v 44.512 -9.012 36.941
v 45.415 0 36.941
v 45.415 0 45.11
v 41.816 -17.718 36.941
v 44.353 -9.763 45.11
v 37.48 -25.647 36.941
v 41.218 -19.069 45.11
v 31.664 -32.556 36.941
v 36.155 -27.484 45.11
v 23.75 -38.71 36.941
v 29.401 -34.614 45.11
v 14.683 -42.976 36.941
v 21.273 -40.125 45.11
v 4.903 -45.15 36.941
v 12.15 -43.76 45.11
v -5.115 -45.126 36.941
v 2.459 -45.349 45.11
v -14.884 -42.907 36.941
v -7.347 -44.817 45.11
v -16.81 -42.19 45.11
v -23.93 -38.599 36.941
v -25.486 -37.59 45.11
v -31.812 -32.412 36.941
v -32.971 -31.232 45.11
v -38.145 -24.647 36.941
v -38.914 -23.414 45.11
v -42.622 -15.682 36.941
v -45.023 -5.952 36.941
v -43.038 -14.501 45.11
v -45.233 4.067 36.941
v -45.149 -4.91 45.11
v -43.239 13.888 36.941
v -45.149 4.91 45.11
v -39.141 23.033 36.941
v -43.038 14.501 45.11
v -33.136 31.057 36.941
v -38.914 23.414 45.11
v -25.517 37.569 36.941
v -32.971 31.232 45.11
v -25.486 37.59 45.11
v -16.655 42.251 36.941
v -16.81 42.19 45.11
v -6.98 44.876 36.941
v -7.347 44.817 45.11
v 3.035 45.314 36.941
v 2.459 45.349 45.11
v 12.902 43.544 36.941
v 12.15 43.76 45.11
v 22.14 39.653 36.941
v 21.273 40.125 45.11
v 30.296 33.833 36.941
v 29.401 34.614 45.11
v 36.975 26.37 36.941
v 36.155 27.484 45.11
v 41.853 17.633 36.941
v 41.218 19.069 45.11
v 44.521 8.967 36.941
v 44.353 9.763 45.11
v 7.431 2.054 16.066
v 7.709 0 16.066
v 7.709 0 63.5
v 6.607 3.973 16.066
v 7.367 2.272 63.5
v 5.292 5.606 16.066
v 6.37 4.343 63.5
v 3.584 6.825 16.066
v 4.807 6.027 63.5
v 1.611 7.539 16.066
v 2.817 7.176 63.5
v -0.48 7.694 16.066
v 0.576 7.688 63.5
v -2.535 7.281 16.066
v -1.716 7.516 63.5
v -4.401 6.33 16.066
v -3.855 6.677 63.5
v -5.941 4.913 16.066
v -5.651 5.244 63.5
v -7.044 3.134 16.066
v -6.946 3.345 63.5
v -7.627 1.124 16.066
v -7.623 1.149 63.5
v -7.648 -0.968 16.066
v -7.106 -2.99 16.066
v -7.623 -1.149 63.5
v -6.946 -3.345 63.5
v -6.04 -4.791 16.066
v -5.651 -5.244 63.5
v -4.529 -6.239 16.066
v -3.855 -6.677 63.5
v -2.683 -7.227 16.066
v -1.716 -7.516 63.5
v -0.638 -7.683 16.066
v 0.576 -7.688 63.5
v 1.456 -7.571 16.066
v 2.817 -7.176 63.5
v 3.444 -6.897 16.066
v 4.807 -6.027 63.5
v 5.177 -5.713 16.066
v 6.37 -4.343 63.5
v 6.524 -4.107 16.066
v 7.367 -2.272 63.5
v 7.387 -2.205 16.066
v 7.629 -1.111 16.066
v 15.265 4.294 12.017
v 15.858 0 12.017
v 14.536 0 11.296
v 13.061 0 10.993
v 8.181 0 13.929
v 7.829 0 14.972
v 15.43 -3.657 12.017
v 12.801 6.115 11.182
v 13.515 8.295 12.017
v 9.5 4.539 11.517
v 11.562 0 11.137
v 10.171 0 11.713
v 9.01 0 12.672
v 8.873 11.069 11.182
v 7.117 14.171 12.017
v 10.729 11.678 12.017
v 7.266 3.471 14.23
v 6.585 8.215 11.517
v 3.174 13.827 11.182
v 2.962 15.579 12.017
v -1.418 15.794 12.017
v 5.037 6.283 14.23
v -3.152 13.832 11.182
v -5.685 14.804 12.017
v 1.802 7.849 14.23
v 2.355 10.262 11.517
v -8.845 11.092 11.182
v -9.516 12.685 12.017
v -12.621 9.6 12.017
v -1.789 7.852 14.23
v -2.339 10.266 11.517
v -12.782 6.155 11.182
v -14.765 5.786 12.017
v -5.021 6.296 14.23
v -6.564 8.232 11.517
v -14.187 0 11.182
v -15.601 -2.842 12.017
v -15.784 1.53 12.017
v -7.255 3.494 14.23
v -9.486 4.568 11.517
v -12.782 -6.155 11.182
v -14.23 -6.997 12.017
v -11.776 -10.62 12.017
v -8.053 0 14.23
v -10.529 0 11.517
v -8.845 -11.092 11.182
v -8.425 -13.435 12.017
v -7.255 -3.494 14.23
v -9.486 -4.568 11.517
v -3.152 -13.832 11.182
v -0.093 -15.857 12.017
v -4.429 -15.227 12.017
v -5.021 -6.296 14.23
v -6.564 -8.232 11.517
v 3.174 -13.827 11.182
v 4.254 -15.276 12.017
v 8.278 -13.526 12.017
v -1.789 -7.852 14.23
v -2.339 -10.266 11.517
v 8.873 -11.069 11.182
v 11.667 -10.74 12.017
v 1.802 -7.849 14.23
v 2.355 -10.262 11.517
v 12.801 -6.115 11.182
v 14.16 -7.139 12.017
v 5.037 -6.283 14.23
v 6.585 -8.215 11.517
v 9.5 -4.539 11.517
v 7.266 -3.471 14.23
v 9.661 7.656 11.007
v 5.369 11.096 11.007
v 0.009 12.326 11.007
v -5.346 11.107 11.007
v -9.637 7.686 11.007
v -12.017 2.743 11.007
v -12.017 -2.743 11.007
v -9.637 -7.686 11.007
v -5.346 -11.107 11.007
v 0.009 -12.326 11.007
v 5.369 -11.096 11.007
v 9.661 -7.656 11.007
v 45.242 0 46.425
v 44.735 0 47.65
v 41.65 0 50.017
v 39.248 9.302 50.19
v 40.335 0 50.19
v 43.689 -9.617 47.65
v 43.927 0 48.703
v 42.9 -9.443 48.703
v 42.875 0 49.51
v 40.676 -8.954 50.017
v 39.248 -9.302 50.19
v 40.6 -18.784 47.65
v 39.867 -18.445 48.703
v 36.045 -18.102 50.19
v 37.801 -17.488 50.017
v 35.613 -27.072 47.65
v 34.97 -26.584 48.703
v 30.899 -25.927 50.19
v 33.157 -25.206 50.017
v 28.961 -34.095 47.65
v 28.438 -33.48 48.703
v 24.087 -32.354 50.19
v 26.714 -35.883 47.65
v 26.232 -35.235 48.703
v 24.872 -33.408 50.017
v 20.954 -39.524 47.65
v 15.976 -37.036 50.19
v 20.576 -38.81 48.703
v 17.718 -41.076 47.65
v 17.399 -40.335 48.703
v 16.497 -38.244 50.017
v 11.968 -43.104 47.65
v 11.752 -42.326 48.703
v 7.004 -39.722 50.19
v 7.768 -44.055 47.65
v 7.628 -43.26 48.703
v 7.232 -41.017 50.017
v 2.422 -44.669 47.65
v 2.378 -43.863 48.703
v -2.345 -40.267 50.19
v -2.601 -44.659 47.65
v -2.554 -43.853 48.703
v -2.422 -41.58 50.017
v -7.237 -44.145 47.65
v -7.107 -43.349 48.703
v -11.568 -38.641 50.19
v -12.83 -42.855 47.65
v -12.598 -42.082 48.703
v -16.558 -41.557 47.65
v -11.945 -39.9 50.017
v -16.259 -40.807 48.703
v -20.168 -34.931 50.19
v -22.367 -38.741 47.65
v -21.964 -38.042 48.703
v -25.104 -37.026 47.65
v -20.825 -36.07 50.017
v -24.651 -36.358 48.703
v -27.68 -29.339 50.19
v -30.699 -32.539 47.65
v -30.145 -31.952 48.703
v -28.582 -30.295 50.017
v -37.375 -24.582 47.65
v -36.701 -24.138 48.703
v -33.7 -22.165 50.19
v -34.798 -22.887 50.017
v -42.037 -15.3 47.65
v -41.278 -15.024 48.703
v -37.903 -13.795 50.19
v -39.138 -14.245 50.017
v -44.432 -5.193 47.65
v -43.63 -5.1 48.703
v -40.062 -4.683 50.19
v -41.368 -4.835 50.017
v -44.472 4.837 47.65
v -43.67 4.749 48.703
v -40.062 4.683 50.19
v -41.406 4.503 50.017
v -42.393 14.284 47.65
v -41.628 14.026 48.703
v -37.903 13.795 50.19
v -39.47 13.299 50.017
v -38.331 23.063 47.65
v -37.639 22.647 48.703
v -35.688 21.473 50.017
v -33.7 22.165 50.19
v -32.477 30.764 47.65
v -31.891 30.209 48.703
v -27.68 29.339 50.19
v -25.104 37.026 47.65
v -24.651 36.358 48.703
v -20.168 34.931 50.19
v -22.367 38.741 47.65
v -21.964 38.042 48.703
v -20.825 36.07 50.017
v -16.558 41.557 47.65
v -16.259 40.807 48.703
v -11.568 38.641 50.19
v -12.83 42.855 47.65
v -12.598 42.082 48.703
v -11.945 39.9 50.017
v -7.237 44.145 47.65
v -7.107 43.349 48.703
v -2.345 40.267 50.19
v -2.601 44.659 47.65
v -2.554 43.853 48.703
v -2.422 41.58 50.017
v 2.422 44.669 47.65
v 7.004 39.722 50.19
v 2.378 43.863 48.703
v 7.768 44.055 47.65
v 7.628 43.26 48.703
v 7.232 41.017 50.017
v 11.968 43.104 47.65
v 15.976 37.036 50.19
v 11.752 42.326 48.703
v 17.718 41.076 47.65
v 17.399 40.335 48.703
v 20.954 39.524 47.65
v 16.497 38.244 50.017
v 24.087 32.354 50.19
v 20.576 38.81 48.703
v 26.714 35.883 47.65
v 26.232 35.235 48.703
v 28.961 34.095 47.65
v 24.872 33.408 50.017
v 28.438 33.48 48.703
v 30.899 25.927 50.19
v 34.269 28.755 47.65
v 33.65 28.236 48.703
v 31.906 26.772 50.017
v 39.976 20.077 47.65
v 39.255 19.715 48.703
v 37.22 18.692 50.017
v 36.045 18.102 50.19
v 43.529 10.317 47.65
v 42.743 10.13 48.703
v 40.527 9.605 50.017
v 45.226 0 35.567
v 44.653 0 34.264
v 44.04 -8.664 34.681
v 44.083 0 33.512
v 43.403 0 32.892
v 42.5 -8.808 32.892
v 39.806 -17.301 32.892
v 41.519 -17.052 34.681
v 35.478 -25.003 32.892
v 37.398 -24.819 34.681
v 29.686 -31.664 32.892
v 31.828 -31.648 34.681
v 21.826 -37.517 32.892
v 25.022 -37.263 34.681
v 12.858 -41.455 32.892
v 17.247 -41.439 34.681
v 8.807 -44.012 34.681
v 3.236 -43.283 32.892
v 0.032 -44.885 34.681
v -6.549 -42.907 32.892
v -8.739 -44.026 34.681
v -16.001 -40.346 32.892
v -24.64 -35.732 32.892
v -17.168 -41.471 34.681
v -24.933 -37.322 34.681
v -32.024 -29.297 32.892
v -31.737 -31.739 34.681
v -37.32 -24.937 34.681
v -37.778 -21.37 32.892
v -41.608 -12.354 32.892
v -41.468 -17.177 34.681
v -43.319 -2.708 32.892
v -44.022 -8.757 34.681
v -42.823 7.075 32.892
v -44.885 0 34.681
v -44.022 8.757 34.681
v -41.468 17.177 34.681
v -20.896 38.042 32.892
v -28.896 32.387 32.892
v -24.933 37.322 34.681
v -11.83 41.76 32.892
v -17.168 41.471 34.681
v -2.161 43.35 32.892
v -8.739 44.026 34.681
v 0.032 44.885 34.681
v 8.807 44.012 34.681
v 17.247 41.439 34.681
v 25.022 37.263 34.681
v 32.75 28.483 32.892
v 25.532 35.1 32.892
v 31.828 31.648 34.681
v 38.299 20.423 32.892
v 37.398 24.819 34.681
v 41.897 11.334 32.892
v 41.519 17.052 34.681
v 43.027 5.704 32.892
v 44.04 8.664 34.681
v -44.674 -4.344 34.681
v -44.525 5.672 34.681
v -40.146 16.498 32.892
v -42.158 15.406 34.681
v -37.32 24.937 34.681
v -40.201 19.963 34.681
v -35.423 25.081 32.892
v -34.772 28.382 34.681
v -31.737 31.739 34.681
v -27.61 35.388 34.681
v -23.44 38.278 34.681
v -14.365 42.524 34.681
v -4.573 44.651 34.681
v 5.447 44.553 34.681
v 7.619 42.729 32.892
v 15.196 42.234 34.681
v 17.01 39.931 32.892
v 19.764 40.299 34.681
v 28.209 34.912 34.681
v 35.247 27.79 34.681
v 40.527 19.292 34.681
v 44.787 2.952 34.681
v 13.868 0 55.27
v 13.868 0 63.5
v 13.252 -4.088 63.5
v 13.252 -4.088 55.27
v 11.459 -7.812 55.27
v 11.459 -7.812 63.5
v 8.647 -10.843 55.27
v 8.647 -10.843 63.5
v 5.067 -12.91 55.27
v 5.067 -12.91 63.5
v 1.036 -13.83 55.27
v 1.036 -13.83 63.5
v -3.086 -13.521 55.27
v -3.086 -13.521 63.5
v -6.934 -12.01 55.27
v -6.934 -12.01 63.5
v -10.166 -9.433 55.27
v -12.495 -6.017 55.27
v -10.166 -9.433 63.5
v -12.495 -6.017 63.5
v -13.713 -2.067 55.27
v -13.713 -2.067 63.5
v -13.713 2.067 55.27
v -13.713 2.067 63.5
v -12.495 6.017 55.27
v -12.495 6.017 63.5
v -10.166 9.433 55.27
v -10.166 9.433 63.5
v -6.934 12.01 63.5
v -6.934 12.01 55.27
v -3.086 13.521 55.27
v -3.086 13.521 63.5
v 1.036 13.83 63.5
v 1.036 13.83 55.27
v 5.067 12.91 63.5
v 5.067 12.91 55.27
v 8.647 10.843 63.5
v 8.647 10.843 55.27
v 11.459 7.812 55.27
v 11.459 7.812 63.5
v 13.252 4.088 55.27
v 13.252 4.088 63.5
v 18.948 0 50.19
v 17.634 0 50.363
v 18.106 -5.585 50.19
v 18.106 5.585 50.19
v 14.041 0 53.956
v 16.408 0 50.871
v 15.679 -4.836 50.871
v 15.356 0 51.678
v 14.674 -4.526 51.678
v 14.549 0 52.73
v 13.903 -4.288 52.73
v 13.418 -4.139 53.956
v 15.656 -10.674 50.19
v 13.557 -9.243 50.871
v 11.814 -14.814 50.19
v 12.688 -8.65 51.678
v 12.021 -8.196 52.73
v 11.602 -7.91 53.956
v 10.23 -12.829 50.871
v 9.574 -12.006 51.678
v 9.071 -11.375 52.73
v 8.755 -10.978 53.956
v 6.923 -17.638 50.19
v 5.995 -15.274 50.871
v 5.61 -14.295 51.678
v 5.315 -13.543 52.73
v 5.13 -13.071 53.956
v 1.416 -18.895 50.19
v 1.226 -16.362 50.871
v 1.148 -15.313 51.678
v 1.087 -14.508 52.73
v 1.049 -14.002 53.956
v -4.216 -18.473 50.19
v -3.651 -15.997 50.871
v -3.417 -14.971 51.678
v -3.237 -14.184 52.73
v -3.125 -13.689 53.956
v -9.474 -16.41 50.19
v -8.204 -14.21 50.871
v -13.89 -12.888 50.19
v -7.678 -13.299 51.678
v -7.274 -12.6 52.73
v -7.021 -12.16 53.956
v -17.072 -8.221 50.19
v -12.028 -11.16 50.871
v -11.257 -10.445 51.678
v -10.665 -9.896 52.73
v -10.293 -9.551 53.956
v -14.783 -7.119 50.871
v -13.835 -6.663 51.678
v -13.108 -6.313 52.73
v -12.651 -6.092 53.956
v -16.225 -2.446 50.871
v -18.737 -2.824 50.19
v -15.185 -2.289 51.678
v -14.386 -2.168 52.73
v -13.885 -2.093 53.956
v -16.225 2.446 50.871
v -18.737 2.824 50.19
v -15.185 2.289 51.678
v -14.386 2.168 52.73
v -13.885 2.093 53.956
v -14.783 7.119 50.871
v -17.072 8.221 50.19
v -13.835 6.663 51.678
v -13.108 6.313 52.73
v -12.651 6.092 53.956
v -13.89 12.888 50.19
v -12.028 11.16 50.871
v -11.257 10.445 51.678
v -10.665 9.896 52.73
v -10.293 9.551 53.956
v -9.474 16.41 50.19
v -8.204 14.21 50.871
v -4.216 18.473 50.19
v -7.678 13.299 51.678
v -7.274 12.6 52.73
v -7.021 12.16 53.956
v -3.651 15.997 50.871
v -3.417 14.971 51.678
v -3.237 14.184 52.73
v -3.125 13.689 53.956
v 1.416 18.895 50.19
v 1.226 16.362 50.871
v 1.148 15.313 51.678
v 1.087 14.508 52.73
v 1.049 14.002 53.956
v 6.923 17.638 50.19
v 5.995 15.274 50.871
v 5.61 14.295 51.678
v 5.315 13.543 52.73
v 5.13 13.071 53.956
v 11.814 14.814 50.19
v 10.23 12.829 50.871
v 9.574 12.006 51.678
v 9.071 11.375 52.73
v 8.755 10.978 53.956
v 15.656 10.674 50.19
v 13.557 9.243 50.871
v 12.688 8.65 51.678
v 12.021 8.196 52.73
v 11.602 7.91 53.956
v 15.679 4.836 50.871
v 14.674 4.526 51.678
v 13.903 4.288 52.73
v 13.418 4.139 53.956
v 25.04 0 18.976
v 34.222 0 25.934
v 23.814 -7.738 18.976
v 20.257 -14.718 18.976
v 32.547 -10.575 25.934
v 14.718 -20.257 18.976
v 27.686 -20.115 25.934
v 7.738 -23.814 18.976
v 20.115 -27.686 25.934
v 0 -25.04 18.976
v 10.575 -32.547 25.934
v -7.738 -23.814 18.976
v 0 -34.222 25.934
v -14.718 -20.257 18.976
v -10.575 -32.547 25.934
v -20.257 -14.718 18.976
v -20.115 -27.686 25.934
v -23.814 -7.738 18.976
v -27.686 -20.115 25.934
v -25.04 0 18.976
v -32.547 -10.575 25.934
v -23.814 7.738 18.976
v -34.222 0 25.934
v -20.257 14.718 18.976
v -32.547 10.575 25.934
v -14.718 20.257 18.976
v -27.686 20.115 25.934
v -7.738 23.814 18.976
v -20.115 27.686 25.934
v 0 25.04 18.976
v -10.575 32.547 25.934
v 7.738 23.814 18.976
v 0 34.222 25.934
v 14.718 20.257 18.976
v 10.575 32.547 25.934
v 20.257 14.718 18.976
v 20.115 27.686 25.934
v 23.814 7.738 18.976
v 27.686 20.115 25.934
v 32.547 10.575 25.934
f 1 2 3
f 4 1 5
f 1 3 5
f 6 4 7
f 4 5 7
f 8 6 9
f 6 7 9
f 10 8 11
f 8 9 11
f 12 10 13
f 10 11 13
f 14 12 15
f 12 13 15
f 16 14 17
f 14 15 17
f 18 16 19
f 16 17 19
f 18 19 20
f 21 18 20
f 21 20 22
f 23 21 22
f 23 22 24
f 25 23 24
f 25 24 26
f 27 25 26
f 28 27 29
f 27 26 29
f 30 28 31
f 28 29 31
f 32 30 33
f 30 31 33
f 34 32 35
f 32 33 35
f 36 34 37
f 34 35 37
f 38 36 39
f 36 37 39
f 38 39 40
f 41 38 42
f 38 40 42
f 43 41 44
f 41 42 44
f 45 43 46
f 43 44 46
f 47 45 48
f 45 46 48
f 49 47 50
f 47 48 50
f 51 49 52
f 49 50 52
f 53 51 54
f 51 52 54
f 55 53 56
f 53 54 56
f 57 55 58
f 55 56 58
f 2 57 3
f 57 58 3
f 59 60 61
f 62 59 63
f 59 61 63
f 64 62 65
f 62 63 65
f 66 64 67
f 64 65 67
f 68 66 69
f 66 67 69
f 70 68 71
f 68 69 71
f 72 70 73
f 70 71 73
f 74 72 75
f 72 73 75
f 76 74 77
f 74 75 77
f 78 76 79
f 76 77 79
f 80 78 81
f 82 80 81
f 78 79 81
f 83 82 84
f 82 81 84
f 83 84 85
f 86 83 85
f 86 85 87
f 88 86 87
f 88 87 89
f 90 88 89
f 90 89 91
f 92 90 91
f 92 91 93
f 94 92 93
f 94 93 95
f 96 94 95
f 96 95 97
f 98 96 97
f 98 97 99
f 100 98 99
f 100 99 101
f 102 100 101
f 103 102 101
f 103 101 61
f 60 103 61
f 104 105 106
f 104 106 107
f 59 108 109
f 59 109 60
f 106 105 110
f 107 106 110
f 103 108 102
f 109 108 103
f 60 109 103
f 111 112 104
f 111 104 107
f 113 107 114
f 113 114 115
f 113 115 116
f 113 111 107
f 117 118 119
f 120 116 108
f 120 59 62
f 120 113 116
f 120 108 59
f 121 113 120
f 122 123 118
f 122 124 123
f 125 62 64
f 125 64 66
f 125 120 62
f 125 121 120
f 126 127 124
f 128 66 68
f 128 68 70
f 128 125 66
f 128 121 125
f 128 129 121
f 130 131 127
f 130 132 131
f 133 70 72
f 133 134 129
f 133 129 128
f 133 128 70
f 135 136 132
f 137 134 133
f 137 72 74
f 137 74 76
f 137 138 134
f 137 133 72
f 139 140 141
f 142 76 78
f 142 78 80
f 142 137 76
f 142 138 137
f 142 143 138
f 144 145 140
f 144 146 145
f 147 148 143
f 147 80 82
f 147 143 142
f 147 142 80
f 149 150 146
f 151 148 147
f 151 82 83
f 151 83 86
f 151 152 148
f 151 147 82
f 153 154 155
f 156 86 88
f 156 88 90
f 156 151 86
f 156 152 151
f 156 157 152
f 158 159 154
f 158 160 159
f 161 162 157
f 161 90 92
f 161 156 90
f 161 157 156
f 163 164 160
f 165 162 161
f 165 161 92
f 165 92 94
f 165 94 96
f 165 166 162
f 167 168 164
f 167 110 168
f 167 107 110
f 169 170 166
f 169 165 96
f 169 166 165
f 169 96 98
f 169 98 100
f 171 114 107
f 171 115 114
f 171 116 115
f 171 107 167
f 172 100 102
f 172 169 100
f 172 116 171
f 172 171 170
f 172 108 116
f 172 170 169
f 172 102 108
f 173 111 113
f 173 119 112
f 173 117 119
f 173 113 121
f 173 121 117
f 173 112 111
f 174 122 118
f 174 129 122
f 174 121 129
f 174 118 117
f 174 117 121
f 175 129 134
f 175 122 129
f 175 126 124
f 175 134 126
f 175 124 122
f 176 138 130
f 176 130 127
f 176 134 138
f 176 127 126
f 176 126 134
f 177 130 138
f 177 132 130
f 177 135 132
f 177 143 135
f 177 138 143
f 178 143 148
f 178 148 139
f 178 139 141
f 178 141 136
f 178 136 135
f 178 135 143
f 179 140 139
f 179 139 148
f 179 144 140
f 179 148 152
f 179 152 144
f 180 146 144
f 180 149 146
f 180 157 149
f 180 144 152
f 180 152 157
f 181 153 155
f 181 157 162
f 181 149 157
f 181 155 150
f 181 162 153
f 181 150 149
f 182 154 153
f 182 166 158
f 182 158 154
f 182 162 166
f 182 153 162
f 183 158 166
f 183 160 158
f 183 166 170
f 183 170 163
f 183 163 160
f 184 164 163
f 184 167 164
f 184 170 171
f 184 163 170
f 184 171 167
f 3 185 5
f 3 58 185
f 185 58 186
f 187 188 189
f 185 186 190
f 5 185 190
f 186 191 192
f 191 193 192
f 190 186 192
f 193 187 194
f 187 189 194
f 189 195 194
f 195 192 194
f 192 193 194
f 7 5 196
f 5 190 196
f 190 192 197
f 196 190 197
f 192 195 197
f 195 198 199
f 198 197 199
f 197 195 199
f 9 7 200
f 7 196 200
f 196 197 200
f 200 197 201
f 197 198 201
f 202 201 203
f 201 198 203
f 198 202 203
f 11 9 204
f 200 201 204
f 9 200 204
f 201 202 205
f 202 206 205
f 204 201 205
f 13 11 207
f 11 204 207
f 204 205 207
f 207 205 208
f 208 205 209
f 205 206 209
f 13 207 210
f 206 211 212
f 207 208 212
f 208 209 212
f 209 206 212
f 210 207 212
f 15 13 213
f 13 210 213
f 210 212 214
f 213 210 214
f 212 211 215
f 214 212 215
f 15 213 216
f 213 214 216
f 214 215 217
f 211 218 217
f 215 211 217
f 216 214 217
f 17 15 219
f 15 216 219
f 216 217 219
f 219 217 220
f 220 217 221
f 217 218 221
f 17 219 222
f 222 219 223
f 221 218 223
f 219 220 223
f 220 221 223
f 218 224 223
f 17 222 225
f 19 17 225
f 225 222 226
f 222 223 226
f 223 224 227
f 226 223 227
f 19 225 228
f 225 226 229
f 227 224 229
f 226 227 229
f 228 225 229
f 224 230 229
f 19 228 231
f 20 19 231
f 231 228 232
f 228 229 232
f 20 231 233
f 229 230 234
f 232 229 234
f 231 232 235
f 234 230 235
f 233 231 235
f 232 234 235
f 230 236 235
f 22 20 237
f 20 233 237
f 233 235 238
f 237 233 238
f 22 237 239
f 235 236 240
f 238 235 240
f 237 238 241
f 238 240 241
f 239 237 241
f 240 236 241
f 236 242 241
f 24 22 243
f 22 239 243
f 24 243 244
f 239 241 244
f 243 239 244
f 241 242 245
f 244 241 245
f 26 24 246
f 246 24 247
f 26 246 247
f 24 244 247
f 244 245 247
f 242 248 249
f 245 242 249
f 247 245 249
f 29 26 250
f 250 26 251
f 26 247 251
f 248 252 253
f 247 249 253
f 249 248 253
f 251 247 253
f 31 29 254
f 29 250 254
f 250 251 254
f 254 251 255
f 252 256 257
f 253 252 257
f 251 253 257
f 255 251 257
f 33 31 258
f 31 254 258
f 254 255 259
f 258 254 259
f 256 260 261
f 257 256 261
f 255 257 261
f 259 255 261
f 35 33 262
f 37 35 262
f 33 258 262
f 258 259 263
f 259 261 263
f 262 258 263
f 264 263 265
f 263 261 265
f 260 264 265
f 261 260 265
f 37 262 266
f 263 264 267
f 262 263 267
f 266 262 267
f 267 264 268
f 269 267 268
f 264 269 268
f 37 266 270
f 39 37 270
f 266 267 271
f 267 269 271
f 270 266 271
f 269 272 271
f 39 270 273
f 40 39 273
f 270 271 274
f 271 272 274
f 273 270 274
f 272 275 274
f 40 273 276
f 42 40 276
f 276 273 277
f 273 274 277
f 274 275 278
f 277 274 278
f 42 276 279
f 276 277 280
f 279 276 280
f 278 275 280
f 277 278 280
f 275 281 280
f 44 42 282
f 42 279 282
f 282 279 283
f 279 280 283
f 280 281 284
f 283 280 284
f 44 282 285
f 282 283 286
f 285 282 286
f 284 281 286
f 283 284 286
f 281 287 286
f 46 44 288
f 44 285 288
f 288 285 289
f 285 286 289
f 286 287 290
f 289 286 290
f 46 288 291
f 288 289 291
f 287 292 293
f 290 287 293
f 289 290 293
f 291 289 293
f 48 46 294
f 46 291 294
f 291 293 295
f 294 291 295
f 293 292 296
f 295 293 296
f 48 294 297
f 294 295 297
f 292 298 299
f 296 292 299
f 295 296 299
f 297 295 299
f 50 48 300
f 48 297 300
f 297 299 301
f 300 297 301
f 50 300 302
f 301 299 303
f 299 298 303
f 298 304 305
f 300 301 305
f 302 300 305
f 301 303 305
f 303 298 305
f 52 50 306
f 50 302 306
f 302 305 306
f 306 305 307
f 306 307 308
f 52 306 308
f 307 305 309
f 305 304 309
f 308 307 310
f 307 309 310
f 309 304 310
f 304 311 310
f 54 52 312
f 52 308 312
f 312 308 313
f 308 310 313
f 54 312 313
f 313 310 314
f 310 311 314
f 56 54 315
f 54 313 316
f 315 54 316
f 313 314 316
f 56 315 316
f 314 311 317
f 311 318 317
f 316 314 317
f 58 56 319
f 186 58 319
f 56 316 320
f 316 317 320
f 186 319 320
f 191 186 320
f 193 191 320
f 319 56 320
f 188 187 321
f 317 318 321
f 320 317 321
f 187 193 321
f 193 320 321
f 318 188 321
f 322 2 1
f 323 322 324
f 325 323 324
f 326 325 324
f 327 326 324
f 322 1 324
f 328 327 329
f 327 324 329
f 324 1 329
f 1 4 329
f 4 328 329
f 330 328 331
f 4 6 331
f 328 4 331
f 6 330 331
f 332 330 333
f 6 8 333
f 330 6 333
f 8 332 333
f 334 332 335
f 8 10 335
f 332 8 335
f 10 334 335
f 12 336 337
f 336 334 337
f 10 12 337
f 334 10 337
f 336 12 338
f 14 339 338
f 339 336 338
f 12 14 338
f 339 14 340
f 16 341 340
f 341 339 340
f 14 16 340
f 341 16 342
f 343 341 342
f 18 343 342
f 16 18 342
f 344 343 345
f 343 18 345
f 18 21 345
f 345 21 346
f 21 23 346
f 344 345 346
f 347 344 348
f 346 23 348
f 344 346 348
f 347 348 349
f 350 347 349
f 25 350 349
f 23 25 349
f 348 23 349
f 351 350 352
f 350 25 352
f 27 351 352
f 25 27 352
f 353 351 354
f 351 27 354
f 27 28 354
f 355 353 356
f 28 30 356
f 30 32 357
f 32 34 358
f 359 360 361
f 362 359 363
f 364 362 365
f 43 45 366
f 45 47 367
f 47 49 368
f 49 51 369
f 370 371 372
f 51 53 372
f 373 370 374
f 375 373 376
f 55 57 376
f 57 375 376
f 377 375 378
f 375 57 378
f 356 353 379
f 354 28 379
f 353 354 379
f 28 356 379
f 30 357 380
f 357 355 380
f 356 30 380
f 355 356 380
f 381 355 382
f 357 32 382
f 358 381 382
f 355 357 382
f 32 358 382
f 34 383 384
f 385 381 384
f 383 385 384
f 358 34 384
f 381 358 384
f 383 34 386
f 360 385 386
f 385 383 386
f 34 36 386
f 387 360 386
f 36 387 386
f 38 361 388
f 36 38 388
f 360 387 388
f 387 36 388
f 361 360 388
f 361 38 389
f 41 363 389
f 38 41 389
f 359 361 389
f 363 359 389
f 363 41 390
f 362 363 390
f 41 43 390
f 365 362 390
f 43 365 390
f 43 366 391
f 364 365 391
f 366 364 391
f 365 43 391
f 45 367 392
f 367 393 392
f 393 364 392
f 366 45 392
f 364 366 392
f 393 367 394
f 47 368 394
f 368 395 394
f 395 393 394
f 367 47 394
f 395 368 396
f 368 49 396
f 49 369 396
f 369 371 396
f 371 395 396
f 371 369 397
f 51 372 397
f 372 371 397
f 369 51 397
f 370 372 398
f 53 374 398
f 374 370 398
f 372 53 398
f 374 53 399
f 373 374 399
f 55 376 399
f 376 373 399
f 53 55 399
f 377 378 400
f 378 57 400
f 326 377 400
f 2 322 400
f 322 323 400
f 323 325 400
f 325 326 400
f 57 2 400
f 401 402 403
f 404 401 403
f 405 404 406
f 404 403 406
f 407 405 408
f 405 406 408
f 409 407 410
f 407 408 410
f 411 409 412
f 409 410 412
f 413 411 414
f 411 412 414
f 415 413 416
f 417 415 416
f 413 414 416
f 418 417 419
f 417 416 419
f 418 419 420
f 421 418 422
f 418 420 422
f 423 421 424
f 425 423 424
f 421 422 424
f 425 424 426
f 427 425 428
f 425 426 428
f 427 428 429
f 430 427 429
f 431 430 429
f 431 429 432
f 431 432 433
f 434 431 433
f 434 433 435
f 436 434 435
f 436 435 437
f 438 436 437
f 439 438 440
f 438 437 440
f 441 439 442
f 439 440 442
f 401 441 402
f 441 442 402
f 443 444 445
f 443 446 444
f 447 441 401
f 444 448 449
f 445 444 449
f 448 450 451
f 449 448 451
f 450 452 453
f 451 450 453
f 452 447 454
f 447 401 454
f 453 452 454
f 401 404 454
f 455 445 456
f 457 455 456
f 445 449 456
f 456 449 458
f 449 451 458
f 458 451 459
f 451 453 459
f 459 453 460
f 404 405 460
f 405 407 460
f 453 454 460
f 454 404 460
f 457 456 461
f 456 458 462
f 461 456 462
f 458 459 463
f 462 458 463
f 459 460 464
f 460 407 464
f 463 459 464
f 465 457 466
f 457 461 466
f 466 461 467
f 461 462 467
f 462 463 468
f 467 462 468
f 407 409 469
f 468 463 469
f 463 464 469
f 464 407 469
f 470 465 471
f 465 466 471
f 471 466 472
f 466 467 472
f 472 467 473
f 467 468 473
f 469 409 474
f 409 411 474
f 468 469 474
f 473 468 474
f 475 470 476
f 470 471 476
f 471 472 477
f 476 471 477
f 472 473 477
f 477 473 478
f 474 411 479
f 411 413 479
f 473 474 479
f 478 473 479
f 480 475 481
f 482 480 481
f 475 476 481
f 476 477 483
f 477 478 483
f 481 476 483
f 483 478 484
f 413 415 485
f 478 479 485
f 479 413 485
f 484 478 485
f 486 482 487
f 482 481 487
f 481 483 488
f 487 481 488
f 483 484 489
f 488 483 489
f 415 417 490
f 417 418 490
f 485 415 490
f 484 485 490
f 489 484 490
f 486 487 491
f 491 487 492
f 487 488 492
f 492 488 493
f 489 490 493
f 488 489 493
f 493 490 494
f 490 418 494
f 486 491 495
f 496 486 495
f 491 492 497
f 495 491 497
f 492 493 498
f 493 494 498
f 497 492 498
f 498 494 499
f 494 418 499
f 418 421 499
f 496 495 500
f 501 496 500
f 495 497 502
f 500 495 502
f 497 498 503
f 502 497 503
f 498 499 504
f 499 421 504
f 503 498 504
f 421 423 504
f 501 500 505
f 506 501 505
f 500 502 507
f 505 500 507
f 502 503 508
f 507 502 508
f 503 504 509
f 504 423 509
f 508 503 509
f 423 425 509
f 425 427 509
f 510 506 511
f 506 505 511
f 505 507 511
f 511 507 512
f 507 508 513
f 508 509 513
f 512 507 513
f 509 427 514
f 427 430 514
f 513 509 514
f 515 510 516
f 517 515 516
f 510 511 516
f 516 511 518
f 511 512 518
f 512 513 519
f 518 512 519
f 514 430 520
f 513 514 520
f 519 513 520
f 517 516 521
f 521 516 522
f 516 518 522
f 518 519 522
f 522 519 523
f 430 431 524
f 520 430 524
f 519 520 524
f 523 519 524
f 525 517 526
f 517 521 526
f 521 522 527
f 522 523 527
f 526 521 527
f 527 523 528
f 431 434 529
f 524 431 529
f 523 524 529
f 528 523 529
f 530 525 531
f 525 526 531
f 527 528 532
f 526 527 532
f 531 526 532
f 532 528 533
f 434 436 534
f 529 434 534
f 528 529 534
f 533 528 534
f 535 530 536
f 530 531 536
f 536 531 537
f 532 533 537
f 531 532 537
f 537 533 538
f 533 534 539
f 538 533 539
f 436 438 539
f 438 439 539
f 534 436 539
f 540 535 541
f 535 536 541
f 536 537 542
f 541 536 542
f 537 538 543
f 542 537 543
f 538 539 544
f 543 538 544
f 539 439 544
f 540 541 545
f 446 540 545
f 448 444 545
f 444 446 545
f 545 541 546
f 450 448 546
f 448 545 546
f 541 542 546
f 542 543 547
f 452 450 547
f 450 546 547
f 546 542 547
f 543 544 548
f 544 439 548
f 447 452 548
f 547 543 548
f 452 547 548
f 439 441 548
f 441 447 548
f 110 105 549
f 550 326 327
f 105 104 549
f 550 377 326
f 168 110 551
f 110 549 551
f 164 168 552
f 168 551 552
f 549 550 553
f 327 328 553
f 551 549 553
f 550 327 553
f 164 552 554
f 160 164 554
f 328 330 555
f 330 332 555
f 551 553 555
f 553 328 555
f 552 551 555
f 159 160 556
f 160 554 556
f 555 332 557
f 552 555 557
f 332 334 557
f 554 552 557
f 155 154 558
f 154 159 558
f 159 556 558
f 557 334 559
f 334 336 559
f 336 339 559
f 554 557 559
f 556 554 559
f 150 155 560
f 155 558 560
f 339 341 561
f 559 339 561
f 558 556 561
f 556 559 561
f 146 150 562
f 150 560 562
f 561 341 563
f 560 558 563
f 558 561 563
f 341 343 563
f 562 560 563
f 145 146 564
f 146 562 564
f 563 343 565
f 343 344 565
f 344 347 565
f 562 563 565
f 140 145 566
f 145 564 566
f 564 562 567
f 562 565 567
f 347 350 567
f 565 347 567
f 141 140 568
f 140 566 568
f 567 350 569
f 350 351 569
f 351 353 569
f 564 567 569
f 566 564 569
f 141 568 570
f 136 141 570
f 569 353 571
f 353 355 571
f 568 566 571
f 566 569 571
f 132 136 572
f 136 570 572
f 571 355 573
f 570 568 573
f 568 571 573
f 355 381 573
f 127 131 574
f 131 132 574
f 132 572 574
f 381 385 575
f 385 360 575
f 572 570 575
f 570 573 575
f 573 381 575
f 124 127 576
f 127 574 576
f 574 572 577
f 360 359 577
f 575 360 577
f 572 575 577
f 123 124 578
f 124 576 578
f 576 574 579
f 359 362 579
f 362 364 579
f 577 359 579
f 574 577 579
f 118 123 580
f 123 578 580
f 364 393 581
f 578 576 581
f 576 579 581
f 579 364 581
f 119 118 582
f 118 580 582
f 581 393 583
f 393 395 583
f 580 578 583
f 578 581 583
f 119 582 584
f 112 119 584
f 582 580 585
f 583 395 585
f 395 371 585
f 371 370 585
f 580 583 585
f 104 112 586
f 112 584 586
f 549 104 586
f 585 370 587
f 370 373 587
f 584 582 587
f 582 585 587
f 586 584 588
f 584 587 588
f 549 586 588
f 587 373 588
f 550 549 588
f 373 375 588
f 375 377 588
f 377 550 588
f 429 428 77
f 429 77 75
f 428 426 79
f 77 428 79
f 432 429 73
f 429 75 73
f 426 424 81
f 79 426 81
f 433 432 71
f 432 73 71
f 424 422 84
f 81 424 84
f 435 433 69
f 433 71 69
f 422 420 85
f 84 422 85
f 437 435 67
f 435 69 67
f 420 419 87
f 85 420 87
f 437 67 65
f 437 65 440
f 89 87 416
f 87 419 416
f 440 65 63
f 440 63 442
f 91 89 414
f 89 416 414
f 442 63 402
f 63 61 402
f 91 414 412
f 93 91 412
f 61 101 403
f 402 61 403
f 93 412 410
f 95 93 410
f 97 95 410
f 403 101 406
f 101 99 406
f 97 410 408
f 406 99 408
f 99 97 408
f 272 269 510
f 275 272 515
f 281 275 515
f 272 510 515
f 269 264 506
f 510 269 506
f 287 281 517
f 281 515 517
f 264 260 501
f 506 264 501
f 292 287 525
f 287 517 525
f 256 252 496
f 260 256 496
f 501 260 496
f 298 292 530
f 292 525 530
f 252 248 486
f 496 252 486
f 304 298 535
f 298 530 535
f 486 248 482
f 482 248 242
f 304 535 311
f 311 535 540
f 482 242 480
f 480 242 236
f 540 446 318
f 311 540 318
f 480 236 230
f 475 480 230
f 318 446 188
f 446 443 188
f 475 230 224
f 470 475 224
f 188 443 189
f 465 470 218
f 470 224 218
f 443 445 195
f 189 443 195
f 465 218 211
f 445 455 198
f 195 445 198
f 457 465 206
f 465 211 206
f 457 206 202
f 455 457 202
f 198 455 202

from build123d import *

# Parameters (mm, degrees)
F2_R     = 7.709402
F3_DEPTH = 88.9
F4_R     = 5.08
F5_R     = 5.08


with BuildPart() as f1:
    # F0 (on Front) → F1 (revolve)
    with BuildSketch(Plane.XZ):
        Polygon((0, 63.5), (0, 0), (45.4152, 34.417), (45.4152, 50.1904), (13.868312, 50.1904), (13.868312, 63.5), align=None)
    revolve(axis=Axis((0, 0, 31.75), (0, 0, -1)))

    # F2 (on face) → F3 (cut)
    with BuildSketch(Plane.XY.offset(63.5)):
        Circle(F2_R)
    extrude(amount=-F3_DEPTH, mode=Mode.SUBTRACT)

    # F4
    f4_edges = [f1.edges().sort_by_distance(p)[0] for p in [
        (-45.4152, 0, 50.1904),
        (-13.868312, 0, 50.1904),
    ]]
    fillet(f4_edges, radius=F4_R)

    # F5
    f5_edges = [f1.edges().sort_by_distance(p)[0] for p in [
        (-7.709402, 0, 5.842416),
        (26.562301, 0, 20.129708),
        (-45.4152, 0, 34.417),
    ]]
    fillet(f5_edges, radius=F5_R)


solid = f1.part
